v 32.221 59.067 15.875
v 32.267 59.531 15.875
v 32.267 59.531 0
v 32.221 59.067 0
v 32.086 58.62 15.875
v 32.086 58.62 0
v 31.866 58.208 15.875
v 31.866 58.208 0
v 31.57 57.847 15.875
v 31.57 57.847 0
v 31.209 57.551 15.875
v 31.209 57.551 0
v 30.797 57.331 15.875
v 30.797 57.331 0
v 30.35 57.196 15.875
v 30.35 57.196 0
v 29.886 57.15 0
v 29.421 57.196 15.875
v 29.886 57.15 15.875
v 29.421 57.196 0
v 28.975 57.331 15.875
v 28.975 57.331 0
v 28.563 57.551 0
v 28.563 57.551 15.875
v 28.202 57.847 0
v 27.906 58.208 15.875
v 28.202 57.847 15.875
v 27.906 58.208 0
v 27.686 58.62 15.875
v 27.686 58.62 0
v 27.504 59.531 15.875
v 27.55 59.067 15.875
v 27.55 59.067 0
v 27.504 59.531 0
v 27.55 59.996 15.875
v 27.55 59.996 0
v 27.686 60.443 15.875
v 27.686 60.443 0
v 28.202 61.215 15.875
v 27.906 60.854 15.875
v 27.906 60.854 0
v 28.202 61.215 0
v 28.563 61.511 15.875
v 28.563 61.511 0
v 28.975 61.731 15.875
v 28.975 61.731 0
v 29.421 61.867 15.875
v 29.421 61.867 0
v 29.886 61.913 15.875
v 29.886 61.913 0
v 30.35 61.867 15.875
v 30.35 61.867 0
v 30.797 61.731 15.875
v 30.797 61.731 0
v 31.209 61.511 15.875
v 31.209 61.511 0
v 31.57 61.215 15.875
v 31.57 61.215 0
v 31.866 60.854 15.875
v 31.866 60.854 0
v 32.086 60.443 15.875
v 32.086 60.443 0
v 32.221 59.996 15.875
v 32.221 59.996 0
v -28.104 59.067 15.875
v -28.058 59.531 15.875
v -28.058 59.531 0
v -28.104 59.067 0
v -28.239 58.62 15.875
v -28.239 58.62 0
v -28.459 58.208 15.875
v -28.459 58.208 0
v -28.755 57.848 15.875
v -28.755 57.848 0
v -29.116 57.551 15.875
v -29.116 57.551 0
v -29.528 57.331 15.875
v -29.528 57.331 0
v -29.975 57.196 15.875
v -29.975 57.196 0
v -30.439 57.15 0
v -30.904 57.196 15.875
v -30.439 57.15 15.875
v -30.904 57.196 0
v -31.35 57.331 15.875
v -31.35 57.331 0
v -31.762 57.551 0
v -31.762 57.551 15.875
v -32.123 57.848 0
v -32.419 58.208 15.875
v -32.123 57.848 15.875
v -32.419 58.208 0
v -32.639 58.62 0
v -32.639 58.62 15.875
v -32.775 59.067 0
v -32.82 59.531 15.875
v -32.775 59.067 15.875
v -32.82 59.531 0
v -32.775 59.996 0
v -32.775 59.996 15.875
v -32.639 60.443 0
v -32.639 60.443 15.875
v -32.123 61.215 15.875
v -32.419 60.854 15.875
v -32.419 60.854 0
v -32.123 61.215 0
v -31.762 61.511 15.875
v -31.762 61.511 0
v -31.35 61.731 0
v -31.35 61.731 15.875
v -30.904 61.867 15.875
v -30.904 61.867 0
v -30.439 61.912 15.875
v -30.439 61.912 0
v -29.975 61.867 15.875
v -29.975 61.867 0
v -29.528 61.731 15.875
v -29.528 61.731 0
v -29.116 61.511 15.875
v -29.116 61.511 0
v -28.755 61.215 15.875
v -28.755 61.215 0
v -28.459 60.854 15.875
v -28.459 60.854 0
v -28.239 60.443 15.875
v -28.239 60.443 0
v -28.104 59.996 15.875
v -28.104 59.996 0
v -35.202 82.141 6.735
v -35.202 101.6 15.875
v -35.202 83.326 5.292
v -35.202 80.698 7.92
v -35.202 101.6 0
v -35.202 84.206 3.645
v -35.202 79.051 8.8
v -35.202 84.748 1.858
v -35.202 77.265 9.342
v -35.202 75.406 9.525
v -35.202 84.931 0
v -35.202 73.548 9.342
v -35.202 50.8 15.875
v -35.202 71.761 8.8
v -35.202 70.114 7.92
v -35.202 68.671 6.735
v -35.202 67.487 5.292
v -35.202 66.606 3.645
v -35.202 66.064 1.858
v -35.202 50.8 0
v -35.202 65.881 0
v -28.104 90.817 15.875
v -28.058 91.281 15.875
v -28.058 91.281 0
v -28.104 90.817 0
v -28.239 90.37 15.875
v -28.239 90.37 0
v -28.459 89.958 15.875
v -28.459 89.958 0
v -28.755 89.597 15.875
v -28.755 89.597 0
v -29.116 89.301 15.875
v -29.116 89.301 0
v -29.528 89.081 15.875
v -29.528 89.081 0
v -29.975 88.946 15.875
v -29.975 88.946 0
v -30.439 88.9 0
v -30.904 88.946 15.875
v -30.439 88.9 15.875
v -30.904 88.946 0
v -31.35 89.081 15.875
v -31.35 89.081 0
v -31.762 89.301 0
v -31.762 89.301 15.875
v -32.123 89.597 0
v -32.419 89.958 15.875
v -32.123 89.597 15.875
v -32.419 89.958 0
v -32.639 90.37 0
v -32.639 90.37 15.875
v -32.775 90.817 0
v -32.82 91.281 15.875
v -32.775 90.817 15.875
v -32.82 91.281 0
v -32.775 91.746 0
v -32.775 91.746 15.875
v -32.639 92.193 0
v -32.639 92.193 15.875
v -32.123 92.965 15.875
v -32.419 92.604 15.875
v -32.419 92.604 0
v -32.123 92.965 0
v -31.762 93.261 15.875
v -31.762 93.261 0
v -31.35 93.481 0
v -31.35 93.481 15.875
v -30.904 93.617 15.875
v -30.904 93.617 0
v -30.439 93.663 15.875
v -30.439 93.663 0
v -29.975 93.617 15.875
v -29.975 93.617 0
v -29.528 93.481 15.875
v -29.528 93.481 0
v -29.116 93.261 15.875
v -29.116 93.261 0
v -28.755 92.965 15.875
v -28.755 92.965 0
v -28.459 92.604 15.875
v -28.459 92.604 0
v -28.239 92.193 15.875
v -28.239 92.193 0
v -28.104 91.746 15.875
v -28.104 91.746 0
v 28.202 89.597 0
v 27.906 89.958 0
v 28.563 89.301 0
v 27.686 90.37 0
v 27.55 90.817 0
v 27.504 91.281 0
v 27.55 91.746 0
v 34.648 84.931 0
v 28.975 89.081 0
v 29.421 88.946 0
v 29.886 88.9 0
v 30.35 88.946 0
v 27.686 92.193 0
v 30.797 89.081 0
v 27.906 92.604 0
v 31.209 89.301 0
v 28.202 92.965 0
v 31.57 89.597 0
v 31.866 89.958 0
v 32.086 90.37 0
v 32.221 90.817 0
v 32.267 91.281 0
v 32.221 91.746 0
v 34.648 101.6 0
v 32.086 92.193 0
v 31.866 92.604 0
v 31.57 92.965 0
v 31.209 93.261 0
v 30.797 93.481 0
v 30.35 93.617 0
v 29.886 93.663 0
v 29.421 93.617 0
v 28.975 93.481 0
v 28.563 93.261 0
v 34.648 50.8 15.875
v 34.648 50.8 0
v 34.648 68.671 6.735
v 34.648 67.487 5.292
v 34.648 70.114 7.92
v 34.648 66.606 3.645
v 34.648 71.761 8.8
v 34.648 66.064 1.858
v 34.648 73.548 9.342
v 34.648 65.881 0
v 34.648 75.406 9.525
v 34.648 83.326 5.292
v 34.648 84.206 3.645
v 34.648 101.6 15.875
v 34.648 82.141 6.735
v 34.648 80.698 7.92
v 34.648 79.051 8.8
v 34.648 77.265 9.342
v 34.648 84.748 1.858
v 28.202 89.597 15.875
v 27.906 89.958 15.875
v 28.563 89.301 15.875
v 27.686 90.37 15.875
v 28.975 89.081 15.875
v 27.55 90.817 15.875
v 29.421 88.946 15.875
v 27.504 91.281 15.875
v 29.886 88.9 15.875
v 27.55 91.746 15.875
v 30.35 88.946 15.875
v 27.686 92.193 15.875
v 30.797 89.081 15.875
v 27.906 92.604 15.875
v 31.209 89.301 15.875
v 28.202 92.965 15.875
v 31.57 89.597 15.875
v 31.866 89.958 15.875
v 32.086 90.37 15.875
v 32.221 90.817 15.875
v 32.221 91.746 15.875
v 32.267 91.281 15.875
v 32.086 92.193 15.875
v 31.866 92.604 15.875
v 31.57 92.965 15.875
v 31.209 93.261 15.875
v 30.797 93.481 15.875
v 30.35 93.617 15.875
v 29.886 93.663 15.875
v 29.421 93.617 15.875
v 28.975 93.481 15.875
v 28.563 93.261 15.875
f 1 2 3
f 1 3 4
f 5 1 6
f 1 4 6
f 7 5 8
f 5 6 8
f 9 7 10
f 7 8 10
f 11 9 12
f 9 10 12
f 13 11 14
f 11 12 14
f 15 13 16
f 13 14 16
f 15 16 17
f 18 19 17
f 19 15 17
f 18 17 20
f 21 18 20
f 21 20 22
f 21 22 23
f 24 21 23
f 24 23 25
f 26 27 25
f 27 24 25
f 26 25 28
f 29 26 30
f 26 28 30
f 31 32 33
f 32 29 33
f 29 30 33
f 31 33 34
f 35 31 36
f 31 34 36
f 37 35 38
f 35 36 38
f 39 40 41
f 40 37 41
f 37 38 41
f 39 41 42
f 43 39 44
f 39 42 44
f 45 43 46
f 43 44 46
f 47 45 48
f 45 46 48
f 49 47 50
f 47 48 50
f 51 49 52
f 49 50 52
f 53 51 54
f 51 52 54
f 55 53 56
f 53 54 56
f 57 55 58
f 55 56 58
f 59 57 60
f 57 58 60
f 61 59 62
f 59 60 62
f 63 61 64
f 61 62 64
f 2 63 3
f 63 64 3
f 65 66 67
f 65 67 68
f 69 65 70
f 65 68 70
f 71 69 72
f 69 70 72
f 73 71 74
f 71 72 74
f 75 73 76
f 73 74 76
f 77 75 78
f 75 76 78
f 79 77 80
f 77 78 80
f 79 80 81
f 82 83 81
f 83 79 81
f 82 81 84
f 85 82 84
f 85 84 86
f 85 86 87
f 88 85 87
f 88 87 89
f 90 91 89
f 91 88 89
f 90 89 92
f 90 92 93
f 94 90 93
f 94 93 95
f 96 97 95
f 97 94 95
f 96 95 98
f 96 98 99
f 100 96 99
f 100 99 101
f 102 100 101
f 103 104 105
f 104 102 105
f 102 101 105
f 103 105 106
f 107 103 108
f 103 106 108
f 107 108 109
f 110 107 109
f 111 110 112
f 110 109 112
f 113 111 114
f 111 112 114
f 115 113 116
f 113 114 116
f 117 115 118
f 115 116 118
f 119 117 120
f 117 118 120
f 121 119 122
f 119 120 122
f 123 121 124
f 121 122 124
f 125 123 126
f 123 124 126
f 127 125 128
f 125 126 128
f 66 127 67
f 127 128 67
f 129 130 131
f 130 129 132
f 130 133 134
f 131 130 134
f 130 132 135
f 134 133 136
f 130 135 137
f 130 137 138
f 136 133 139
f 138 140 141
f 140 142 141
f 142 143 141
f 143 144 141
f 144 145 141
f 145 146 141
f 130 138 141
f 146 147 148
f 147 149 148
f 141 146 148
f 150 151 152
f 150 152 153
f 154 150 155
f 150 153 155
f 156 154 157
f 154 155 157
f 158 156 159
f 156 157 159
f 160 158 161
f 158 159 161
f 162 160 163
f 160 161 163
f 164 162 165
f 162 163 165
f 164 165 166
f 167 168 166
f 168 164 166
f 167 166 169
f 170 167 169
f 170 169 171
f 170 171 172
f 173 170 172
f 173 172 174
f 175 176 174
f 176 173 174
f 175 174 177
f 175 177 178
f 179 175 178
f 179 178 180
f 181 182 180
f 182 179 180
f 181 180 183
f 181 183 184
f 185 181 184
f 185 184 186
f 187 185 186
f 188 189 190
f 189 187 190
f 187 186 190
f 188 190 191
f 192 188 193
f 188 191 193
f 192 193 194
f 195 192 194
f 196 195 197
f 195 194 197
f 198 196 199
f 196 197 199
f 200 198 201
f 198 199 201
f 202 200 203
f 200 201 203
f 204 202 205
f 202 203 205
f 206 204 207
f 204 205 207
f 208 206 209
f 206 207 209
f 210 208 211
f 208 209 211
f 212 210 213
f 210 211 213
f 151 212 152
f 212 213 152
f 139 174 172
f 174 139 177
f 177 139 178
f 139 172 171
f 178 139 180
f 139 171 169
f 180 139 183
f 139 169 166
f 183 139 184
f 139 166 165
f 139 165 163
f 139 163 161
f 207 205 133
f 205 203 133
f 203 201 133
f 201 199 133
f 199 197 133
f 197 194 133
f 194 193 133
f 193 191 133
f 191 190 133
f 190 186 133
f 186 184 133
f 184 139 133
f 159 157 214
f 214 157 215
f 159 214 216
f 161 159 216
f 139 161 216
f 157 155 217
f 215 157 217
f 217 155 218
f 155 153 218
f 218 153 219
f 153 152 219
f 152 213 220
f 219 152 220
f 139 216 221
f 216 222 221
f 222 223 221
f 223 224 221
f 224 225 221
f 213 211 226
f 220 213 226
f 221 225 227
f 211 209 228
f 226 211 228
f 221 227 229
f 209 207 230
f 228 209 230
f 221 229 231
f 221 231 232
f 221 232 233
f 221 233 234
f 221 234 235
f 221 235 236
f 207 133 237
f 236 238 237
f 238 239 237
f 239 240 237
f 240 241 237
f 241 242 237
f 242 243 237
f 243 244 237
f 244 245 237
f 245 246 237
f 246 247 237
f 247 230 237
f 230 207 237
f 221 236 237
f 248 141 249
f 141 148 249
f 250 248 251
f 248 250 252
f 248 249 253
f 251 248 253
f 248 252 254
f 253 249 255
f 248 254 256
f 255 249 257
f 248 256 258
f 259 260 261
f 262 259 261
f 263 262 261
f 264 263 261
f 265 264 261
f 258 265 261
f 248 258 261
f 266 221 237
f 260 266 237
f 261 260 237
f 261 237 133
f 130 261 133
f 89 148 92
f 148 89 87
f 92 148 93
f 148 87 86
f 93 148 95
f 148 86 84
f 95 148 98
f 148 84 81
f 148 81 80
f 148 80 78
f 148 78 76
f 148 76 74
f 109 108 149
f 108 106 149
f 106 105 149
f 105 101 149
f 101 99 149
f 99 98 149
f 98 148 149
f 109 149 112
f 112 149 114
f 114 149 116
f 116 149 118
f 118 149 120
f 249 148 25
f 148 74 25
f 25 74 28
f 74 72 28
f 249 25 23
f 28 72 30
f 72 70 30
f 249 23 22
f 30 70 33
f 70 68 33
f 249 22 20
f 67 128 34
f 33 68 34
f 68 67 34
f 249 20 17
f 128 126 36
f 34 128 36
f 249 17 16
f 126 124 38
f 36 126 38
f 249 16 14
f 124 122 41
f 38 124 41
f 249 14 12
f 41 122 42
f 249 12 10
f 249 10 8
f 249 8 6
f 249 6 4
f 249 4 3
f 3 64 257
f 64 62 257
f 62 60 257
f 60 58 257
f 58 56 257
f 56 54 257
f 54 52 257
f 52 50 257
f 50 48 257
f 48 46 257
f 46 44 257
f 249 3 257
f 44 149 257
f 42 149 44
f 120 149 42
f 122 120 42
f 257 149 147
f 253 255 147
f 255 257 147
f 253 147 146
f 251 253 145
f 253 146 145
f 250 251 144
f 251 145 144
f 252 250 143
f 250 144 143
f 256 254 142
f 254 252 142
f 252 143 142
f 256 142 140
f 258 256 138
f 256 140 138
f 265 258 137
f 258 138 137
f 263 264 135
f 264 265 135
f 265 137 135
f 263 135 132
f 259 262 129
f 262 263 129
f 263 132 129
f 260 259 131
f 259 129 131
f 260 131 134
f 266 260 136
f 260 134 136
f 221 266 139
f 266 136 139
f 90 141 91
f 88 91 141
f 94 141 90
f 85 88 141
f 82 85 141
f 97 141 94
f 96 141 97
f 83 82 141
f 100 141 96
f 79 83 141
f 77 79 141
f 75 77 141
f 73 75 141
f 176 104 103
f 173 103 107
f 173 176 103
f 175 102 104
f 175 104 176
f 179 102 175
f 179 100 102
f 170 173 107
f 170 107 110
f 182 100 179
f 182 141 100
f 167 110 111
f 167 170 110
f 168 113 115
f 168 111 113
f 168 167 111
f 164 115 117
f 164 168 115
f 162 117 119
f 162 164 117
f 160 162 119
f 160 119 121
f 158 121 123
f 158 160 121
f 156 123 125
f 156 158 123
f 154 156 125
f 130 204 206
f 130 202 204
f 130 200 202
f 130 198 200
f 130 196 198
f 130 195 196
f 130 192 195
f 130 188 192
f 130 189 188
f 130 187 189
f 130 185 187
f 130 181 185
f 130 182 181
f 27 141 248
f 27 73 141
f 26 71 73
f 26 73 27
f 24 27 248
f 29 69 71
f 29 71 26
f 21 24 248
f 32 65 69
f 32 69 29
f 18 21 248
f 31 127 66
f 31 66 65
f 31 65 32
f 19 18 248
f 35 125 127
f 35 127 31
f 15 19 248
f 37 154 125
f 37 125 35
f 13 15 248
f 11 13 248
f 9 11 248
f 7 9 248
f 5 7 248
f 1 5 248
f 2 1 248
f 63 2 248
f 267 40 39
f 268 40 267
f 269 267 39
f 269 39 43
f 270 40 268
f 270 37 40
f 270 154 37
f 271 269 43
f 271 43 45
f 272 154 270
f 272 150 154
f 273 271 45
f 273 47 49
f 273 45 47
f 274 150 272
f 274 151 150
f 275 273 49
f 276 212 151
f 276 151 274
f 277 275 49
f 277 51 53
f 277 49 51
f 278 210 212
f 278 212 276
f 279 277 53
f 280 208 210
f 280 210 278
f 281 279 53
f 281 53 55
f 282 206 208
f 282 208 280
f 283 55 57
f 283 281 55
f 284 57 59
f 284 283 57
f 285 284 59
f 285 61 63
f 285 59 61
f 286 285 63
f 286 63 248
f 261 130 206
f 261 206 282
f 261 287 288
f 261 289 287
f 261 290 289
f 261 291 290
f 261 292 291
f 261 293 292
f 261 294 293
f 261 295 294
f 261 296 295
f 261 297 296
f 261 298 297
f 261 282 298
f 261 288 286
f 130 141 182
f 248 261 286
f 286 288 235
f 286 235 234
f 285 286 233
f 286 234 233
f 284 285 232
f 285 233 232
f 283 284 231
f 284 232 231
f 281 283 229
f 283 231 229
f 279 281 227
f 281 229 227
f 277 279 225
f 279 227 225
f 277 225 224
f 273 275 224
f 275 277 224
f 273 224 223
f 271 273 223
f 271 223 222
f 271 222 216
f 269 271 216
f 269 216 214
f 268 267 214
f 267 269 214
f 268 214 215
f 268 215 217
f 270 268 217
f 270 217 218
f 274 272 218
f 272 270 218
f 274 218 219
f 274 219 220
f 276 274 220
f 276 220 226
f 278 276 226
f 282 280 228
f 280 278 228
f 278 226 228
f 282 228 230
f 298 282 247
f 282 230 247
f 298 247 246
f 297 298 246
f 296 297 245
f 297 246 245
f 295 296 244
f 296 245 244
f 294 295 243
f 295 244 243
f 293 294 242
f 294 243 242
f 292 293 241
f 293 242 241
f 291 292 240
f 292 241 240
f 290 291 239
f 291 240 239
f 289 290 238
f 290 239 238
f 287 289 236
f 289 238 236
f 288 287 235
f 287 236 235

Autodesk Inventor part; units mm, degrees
ref_plane "YZ Plane" through (0, 0, 0) normal (1, 0, 0) x (0, 1, 0)
ref_plane "XZ Plane" through (0, 0, 0) normal (0, 1, 0) x (-1, 0, 0)
ref_plane "XY Plane" through (0, 0, 0) normal (0, 0, 1) x (1, 0, 0)
sketch "Sketch1" plane through (0, 0, 0) normal (0, 0, 1) x (1, 0, 0)
  circle A0 centre (29.8858, 59.5313) radius 2.3813 projected
  circle A1 centre (-30.4392, 59.5313) radius 2.3812 projected
  circle A2 centre (-30.4392, 91.2813) radius 2.3813 projected
  circle A3 centre (29.8858, 91.2813) radius 2.3813 projected
  circle A4 centre (-30.4392, 91.2813) radius 2.3813 projected
  circle A5 centre (29.8858, 91.2813) radius 2.3813 projected
  line L0 (-35.2017, 84.9313) -> (34.6483, 84.9313) projected
  line L1 (34.6483, 84.9313) -> (34.6483, 101.6) projected
  line L2 (34.6483, 101.6) -> (-35.2017, 101.6) projected
  line L3 (-35.2017, 101.6) -> (-35.2017, 84.9313) projected
  line L4 (34.6483, 101.6) -> (-35.2017, 101.6)
  line L5 (-35.2017, 101.6) -> (-35.2017, 50.8)
  line L6 (-35.2017, 50.8) -> (34.6483, 50.8)
  line L7 (34.6483, 50.8) -> (34.6483, 101.6)
  point P0 (0, 0)
  dimension "d0" = 50.8
extrude "Extrusion1" add sketch "Sketch1" along normal blind 15.875
sketch "Sketch2" plane through (-35.2017, 50.8, 0) normal (-1, 0, 0) x (0, 0, 1)
  arc A0 (0, 34.1313) -> (0, 15.0813) centre (0, 24.6063) ccw projected
  circle A1 centre (0, 24.6063) radius 9.525
  point P0 (0, -50.8)
  point P1 (0, 15.0813)
  point P2 (0, 34.1313)
extrude "Extrusion2" cut sketch "Sketch2" against normal blind 76.2
properties part number "YClampTop"
